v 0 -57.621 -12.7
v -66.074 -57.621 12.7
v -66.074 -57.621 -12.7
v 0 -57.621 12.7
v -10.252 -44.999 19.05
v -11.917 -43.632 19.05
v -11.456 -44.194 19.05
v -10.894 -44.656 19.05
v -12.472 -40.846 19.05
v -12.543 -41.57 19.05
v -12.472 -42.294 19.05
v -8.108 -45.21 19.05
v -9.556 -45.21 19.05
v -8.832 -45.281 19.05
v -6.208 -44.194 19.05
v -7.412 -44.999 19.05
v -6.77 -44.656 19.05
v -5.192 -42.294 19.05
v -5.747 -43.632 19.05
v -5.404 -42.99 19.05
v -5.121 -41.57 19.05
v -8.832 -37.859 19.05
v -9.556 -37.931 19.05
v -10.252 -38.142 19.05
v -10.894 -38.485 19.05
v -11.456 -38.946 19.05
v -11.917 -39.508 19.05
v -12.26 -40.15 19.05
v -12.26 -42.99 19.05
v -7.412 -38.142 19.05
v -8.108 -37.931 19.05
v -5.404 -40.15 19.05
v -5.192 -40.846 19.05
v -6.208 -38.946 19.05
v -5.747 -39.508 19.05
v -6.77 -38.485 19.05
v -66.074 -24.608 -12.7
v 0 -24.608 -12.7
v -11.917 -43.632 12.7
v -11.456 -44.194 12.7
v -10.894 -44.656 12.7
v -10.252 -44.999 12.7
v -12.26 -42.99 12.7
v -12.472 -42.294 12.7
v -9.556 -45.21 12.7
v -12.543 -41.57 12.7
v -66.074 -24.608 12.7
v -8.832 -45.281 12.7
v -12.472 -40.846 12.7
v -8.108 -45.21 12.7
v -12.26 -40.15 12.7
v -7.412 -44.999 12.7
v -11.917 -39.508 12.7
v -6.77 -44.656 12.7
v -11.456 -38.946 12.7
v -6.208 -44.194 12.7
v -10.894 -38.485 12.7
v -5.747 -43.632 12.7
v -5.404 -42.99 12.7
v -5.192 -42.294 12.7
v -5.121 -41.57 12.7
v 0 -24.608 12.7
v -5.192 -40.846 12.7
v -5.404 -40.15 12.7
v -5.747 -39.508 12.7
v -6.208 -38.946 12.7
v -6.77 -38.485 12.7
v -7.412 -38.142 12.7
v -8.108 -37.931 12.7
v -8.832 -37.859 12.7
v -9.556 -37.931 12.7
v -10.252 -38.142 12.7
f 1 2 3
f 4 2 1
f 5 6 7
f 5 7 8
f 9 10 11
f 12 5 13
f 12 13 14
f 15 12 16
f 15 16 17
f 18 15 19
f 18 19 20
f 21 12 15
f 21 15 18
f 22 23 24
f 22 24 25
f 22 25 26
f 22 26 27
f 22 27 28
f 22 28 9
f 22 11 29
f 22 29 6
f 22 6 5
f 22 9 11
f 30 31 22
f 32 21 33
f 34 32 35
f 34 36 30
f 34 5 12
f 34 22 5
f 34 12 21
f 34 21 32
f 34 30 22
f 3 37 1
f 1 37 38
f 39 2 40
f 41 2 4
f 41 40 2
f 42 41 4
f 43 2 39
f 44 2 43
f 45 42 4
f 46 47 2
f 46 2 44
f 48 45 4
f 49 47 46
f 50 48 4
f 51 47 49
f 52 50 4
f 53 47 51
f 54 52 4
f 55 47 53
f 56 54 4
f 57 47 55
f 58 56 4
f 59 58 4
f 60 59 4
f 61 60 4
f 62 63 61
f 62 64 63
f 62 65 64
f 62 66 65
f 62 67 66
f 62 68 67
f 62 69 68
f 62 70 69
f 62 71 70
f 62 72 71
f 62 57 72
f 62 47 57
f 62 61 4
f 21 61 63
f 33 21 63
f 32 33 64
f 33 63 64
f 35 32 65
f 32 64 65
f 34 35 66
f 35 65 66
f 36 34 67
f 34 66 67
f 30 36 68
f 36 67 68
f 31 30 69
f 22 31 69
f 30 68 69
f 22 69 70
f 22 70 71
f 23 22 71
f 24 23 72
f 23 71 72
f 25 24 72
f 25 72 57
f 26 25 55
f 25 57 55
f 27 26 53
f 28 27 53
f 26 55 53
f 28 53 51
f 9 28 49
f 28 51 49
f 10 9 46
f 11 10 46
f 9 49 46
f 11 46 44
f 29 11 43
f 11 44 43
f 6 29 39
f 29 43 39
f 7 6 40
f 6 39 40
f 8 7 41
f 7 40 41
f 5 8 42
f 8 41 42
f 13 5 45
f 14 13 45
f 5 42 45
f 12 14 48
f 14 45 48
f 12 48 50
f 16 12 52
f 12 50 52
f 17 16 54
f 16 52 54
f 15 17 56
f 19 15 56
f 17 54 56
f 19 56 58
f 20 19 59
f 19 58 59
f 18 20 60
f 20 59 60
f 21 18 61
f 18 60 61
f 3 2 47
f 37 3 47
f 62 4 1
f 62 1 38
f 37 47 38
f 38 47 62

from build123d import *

# Parameters (mm, degrees)
F0_W     = 66.074446
F0_H     = 33.013113
F1_DEPTH = 12.7
F2_R     = 3.71087
F3_DEPTH = 6.35


with BuildPart() as f1:
    # F0 (on Top) → F1 (new body, symmetric)
    with BuildSketch(Plane.XY):
        with Locations((-33.037223, -41.1149)):
            Rectangle(F0_W, F0_H)
    extrude(amount=F1_DEPTH, both=True)

    # F2 (on face) → F3 (join)
    with BuildSketch(Plane.XY.offset(12.7)):
        with Locations((-8.831992, -41.570105)):
            Circle(F2_R)
    extrude(amount=F3_DEPTH)


solid = f1.part
